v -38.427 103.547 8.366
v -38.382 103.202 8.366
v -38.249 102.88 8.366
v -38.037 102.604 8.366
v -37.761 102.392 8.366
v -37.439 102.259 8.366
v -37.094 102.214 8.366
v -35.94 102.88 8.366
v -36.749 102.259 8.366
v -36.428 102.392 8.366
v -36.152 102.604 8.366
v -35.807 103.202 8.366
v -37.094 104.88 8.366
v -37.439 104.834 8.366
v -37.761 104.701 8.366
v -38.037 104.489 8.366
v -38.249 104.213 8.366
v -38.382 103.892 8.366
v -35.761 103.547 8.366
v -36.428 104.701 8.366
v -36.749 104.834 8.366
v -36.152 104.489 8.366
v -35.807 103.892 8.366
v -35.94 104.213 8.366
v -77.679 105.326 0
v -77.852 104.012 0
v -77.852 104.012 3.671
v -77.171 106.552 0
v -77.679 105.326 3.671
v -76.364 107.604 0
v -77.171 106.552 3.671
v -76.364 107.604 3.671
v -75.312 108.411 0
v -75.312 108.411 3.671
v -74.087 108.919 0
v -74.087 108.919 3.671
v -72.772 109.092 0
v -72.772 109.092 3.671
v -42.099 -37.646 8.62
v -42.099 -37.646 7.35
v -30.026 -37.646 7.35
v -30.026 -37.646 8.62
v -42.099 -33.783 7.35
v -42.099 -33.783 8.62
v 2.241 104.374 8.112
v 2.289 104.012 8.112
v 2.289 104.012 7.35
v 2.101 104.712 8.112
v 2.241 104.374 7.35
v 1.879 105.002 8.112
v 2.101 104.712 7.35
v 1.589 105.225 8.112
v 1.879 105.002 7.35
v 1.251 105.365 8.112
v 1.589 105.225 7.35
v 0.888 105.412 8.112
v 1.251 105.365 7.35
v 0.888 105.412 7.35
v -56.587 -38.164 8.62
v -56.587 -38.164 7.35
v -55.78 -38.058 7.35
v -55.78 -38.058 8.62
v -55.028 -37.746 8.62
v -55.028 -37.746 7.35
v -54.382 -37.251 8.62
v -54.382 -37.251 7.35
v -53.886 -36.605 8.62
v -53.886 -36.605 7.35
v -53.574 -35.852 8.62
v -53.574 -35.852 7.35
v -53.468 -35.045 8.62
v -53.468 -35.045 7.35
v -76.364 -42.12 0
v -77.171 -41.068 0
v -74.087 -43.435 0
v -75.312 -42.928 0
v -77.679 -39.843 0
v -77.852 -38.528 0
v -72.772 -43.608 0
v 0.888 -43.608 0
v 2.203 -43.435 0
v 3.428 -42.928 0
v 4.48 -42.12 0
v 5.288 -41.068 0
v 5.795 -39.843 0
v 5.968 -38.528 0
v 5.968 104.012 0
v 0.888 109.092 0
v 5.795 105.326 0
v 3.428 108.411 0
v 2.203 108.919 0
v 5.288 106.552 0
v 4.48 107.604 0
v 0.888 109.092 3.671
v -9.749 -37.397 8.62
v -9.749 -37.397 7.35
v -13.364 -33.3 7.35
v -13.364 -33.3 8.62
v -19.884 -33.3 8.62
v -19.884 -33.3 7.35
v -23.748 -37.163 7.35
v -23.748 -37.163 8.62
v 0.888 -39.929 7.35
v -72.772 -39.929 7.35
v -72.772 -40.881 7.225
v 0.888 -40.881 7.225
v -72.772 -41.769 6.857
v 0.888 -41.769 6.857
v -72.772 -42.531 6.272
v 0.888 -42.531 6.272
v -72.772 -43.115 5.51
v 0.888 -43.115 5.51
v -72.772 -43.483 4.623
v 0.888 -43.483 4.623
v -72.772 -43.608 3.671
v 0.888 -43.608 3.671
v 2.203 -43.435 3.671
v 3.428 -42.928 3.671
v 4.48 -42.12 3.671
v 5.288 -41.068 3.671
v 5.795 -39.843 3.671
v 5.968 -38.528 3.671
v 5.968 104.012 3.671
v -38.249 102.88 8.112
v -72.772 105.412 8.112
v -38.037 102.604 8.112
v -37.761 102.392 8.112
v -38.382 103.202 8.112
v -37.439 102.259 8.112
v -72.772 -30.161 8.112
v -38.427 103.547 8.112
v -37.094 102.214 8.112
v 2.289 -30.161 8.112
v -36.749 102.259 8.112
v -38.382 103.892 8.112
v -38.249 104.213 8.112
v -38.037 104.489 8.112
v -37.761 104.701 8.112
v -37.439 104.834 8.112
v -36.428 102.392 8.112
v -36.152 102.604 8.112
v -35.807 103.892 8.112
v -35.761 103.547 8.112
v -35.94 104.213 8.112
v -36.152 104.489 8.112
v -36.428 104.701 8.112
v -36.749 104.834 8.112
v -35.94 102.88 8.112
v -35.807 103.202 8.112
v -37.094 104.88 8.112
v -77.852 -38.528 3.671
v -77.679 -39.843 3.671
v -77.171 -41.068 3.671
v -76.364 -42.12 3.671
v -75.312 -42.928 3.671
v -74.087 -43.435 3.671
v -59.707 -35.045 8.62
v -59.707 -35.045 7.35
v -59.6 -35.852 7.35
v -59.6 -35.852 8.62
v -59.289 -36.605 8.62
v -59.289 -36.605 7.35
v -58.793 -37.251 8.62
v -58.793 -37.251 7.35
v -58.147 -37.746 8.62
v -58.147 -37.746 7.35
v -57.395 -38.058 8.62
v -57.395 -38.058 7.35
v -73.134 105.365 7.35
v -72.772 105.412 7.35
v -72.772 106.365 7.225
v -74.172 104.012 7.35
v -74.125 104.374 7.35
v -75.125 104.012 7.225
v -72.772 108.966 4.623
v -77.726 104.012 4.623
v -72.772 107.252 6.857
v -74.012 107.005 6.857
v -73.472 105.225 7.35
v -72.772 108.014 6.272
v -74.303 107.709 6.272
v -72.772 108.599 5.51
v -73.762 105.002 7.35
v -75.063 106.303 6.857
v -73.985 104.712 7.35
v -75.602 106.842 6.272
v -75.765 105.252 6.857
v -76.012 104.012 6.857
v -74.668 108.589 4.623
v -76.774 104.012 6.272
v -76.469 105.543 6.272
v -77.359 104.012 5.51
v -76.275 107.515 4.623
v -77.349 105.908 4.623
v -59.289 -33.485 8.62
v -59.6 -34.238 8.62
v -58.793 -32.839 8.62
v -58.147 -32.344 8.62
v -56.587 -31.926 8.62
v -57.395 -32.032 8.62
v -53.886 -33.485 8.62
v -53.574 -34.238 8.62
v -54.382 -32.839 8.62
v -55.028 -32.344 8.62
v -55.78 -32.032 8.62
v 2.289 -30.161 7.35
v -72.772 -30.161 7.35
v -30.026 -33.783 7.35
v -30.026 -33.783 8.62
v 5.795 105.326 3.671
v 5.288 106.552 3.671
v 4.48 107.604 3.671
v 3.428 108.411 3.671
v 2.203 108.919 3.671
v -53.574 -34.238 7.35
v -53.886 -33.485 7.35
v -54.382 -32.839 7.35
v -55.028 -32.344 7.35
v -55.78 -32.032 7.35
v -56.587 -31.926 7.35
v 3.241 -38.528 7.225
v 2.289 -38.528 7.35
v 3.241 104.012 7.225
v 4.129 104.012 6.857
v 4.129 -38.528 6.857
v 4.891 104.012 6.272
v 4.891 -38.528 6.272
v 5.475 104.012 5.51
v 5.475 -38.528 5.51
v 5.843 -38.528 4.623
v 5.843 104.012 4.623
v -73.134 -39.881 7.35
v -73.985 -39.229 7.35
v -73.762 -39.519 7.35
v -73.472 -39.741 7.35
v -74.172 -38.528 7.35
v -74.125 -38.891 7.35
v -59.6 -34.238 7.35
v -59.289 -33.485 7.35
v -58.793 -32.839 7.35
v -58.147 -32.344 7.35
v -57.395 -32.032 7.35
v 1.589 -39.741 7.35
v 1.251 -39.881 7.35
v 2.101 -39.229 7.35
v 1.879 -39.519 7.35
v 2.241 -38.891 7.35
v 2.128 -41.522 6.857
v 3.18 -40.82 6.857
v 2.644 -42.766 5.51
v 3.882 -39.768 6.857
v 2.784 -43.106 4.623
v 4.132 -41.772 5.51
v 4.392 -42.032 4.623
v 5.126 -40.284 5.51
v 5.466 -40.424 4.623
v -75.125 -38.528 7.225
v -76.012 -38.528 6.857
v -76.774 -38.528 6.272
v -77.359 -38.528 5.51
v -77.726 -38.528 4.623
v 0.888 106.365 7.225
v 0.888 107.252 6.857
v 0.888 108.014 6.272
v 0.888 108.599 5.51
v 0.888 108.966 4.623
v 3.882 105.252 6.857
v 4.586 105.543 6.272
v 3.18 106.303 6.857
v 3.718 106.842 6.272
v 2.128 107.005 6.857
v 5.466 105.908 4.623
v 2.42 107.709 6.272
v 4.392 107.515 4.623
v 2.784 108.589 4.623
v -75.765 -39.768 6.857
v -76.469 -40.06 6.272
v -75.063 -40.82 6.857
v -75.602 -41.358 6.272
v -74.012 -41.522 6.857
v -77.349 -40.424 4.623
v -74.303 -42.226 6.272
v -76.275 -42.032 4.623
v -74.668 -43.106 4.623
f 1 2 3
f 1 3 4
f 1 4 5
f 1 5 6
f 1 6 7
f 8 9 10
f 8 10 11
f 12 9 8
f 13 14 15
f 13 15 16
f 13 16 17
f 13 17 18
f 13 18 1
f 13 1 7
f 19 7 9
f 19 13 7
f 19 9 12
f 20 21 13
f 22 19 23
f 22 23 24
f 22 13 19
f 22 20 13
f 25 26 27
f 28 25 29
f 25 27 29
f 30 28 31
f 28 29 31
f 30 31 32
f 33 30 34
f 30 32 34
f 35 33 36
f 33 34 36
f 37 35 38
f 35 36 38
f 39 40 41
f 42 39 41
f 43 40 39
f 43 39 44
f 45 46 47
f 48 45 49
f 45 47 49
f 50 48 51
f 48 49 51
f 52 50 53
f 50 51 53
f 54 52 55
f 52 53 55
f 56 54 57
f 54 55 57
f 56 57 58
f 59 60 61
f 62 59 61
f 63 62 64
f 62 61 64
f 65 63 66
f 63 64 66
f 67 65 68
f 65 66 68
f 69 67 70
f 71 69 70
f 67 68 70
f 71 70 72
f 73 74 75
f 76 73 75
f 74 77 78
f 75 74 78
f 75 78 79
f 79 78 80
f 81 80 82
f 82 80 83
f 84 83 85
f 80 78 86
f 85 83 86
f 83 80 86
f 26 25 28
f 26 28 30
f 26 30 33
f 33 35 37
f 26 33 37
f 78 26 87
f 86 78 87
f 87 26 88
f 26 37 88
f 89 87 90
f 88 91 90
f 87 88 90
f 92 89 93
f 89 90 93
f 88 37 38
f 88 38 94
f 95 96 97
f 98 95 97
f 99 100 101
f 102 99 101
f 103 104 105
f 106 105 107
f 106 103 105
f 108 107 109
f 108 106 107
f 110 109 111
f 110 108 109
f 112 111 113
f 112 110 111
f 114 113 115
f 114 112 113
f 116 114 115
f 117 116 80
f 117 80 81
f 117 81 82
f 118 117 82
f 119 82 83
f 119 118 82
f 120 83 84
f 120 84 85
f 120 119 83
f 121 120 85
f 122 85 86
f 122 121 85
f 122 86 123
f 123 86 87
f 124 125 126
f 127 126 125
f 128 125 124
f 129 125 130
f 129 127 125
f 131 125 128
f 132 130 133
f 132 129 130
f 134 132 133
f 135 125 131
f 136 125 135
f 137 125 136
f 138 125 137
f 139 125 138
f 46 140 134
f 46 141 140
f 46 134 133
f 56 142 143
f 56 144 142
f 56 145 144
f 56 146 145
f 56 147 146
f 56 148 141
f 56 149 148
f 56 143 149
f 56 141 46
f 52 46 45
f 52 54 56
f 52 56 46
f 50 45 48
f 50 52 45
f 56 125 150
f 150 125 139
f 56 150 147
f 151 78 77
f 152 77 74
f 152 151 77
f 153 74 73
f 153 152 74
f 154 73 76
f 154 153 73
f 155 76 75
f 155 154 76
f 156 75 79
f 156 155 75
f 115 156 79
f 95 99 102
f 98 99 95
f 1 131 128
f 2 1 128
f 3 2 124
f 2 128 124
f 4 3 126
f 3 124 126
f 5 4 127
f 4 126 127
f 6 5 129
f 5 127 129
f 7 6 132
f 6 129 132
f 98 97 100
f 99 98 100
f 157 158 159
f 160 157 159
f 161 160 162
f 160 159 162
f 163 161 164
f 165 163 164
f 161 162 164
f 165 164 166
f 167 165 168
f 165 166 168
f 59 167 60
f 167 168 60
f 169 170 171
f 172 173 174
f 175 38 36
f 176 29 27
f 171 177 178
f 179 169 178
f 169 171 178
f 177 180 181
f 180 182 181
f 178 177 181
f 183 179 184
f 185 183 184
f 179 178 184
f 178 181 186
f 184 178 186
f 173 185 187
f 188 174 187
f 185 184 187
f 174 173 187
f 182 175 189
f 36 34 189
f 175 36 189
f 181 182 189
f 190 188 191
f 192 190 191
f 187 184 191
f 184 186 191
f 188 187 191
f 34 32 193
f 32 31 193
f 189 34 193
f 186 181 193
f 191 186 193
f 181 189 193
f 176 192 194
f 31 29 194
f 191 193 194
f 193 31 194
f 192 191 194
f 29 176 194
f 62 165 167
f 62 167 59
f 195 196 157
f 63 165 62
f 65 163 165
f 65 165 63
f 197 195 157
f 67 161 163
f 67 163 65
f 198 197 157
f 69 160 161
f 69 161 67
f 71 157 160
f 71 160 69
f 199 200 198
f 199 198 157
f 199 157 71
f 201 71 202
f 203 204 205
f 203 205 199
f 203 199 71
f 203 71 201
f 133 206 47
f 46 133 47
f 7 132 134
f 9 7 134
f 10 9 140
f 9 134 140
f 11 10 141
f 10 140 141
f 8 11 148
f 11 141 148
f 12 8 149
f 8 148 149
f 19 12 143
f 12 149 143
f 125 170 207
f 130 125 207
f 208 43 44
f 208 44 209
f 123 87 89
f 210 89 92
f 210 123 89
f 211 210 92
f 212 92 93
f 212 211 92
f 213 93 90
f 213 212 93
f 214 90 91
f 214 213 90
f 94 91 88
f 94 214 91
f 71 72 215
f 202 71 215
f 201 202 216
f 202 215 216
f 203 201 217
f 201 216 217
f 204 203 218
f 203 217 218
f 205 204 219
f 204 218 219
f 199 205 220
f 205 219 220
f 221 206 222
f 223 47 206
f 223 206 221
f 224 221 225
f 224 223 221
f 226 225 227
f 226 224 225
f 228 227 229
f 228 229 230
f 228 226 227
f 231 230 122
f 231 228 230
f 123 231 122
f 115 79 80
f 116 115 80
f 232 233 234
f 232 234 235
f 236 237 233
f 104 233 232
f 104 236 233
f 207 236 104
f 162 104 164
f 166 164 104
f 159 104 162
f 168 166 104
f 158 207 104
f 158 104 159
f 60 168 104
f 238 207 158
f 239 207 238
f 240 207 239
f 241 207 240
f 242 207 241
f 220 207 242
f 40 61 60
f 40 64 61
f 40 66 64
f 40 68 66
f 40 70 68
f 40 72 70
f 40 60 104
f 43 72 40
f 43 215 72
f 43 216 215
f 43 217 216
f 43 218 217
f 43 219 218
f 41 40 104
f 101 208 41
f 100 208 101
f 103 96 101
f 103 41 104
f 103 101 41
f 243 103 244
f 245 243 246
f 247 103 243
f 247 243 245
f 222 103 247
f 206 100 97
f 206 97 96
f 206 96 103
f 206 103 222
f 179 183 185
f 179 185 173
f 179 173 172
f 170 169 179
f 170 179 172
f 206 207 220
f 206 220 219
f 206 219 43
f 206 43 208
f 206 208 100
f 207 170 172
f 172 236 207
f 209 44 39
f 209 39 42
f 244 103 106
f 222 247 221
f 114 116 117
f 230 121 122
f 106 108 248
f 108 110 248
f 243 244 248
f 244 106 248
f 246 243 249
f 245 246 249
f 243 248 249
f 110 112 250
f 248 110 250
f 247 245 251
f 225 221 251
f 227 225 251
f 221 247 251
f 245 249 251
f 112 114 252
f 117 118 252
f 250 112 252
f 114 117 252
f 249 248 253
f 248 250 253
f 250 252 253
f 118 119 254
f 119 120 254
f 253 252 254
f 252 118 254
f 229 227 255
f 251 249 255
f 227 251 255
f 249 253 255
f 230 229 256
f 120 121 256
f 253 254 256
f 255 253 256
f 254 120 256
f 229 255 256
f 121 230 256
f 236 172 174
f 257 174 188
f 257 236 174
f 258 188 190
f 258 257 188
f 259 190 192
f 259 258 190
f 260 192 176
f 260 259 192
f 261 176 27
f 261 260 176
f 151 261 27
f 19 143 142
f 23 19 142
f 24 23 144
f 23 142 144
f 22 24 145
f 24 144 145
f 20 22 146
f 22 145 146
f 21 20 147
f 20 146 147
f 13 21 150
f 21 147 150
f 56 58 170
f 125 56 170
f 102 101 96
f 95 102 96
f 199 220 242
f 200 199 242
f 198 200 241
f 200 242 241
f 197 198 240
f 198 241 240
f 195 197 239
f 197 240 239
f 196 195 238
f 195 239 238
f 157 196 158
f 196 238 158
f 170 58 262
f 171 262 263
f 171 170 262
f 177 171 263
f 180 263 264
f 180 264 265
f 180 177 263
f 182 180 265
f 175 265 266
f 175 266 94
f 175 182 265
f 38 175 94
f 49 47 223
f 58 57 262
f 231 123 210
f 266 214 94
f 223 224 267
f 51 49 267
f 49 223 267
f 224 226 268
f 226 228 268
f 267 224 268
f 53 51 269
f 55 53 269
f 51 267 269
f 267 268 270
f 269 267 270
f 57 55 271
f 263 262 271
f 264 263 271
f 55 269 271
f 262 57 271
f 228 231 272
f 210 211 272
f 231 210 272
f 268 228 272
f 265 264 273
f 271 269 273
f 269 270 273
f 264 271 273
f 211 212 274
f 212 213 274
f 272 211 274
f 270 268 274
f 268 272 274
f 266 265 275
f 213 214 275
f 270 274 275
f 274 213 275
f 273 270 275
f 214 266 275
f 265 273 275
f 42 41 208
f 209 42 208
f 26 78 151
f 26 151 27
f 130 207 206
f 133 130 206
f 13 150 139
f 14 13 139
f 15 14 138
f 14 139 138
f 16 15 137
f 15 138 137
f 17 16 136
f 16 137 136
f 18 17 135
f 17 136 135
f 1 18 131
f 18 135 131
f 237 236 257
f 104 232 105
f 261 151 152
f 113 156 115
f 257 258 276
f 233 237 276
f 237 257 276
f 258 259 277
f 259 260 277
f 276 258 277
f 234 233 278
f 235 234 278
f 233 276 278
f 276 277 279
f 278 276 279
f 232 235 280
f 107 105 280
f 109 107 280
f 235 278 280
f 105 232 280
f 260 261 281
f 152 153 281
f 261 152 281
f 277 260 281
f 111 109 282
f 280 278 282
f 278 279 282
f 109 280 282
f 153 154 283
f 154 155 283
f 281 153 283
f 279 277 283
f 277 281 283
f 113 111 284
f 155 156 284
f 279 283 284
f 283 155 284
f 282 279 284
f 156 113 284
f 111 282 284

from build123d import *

# Parameters (mm, degrees)
F0_W     = 83.82
F0_H     = 152.6999994
F1_DEPTH = 7.35000054
F2_R     = 5.08
F3_R     = 3.6792614691
F5_DEPTH = 0.762
F4_W     = 12.0734181255
F4_H     = 3.8634948432
F6_DEPTH = 1.27
F8_DEPTH = 0.254


with BuildPart() as f1:
    # F0 (on Top) → F1 (new body)
    with BuildSketch(Plane.XY):
        with Locations((-35.9417264286, 32.7416635112)):
            Rectangle(F0_W, F0_H)
    extrude(amount=F1_DEPTH)

    # F2
    f2_edges = [f1.edges().sort_by_distance(p)[0] for p in [
        (5.968274, -43.608336, 3.675),
        (-77.851726, -43.608336, 3.675),
        (-77.851726, 109.091663, 3.675),
        (5.968274, 109.091663, 3.675),
    ]]
    fillet(f2_edges, radius=F2_R)

    # F3
    f3_edges = [f1.edges().sort_by_distance(p)[0] for p in [
        (5.968274, 32.741664, 7.350001),
        (-77.851726, 32.741664, 7.350001),
    ]]
    fillet(f3_edges, radius=F3_R)

    # F4 (on face) → F5 (join)
    with BuildSketch(Plane.XY.offset(7.35000054)):
        with BuildLine():
            Line((0.8882735714, 105.4124017422), (-72.7717264286, 105.4124017422))
            Line((-72.7717264286, 105.4124017422), (-72.7717264286, -30.1608517766))
            Line((-72.7717264286, -30.1608517766), (-56.5872713923, -30.1608517766))
            Line((-56.5872713923, -30.1608517766), (2.2890121023, -30.1608517766))
            Line((2.2890121023, -30.1608517766), (2.2890121023, 104.0116632112))
            ThreePointArc((2.2890121023, 104.0116632112), (1.8787452853, 105.0021349251), (0.8882735714, 105.4124017422))
        make_face()
    extrude(amount=F5_DEPTH)

    # F4 (on face) → F6 (join)
    with BuildSketch(Plane.XY.offset(7.35000054)):
        with Locations((-36.062461324, -35.7146207243)):
            Rectangle(F4_W, F4_H)
        with BuildLine():
            ThreePointArc((-53.467959375, -35.0449632482), (-54.3815847122, -32.839276568), (-56.5872713923, -31.9256512308))
            Line((-56.5872713923, -31.9256512308), (-56.5872713923, -35.0449632482))
            Line((-56.5872713923, -35.0449632482), (-56.5872713923, -38.1642752656))
            ThreePointArc((-56.5872713923, -38.1642752656), (-54.3815847122, -37.2506499283), (-53.467959375, -35.0449632482))
        make_face()
        with BuildLine():
            Line((-56.5872713923, -35.0449632482), (-56.5872713923, -31.9256512308))
            ThreePointArc((-56.5872713923, -31.9256512308), (-58.7929580725, -32.839276568), (-59.7065834097, -35.0449632482))
            Line((-59.7065834097, -35.0449632482), (-56.5872713923, -35.0449632482))
        make_face()
        with BuildLine():
            Line((-56.5872713923, -35.0449632482), (-59.7065834097, -35.0449632482))
            ThreePointArc((-59.7065834097, -35.0449632482), (-58.7929580725, -37.2506499283), (-56.5872713923, -38.1642752656))
            Line((-56.5872713923, -38.1642752656), (-56.5872713923, -35.0449632482))
        make_face()
        Polygon((-19.8840815574, -33.2999378443), (-23.747574538, -37.1634289622), (-9.7494691825, -37.3968959546), (-13.3644351736, -33.2999378443), align=None)
    extrude(amount=F6_DEPTH)

    # F7 (on face) → F8 (join)
    with BuildSketch(Plane.XY.offset(8.11200054)):
        with BuildLine():
            Line((-37.0942167938, 103.5466420086), (-38.4271452132, 103.5466420086))
            ThreePointArc((-38.4271452132, 103.5466420086), (-38.036739518, 102.6041192844), (-37.0942167938, 102.2137135892))
            Line((-37.0942167938, 102.2137135892), (-37.0942167938, 103.5466420086))
        make_face()
        with BuildLine():
            Line((-35.7612883744, 103.5466420086), (-37.0942167938, 103.5466420086))
            Line((-37.0942167938, 103.5466420086), (-37.0942167938, 102.2137135892))
            ThreePointArc((-37.0942167938, 102.2137135892), (-36.1516940696, 102.6041192844), (-35.7612883744, 103.5466420086))
        make_face()
        with BuildLine():
            ThreePointArc((-35.7612883744, 103.5466420086), (-36.1516940696, 104.4891647328), (-37.0942167938, 104.879570428))
            Line((-37.0942167938, 104.879570428), (-37.0942167938, 103.5466420086))
            Line((-37.0942167938, 103.5466420086), (-35.7612883744, 103.5466420086))
        make_face()
        with BuildLine():
            Line((-37.0942167938, 103.5466420086), (-37.0942167938, 104.879570428))
            ThreePointArc((-37.0942167938, 104.879570428), (-38.036739518, 104.4891647328), (-38.4271452132, 103.5466420086))
            Line((-38.4271452132, 103.5466420086), (-37.0942167938, 103.5466420086))
        make_face()
    extrude(amount=F8_DEPTH)


solid = f1.part
